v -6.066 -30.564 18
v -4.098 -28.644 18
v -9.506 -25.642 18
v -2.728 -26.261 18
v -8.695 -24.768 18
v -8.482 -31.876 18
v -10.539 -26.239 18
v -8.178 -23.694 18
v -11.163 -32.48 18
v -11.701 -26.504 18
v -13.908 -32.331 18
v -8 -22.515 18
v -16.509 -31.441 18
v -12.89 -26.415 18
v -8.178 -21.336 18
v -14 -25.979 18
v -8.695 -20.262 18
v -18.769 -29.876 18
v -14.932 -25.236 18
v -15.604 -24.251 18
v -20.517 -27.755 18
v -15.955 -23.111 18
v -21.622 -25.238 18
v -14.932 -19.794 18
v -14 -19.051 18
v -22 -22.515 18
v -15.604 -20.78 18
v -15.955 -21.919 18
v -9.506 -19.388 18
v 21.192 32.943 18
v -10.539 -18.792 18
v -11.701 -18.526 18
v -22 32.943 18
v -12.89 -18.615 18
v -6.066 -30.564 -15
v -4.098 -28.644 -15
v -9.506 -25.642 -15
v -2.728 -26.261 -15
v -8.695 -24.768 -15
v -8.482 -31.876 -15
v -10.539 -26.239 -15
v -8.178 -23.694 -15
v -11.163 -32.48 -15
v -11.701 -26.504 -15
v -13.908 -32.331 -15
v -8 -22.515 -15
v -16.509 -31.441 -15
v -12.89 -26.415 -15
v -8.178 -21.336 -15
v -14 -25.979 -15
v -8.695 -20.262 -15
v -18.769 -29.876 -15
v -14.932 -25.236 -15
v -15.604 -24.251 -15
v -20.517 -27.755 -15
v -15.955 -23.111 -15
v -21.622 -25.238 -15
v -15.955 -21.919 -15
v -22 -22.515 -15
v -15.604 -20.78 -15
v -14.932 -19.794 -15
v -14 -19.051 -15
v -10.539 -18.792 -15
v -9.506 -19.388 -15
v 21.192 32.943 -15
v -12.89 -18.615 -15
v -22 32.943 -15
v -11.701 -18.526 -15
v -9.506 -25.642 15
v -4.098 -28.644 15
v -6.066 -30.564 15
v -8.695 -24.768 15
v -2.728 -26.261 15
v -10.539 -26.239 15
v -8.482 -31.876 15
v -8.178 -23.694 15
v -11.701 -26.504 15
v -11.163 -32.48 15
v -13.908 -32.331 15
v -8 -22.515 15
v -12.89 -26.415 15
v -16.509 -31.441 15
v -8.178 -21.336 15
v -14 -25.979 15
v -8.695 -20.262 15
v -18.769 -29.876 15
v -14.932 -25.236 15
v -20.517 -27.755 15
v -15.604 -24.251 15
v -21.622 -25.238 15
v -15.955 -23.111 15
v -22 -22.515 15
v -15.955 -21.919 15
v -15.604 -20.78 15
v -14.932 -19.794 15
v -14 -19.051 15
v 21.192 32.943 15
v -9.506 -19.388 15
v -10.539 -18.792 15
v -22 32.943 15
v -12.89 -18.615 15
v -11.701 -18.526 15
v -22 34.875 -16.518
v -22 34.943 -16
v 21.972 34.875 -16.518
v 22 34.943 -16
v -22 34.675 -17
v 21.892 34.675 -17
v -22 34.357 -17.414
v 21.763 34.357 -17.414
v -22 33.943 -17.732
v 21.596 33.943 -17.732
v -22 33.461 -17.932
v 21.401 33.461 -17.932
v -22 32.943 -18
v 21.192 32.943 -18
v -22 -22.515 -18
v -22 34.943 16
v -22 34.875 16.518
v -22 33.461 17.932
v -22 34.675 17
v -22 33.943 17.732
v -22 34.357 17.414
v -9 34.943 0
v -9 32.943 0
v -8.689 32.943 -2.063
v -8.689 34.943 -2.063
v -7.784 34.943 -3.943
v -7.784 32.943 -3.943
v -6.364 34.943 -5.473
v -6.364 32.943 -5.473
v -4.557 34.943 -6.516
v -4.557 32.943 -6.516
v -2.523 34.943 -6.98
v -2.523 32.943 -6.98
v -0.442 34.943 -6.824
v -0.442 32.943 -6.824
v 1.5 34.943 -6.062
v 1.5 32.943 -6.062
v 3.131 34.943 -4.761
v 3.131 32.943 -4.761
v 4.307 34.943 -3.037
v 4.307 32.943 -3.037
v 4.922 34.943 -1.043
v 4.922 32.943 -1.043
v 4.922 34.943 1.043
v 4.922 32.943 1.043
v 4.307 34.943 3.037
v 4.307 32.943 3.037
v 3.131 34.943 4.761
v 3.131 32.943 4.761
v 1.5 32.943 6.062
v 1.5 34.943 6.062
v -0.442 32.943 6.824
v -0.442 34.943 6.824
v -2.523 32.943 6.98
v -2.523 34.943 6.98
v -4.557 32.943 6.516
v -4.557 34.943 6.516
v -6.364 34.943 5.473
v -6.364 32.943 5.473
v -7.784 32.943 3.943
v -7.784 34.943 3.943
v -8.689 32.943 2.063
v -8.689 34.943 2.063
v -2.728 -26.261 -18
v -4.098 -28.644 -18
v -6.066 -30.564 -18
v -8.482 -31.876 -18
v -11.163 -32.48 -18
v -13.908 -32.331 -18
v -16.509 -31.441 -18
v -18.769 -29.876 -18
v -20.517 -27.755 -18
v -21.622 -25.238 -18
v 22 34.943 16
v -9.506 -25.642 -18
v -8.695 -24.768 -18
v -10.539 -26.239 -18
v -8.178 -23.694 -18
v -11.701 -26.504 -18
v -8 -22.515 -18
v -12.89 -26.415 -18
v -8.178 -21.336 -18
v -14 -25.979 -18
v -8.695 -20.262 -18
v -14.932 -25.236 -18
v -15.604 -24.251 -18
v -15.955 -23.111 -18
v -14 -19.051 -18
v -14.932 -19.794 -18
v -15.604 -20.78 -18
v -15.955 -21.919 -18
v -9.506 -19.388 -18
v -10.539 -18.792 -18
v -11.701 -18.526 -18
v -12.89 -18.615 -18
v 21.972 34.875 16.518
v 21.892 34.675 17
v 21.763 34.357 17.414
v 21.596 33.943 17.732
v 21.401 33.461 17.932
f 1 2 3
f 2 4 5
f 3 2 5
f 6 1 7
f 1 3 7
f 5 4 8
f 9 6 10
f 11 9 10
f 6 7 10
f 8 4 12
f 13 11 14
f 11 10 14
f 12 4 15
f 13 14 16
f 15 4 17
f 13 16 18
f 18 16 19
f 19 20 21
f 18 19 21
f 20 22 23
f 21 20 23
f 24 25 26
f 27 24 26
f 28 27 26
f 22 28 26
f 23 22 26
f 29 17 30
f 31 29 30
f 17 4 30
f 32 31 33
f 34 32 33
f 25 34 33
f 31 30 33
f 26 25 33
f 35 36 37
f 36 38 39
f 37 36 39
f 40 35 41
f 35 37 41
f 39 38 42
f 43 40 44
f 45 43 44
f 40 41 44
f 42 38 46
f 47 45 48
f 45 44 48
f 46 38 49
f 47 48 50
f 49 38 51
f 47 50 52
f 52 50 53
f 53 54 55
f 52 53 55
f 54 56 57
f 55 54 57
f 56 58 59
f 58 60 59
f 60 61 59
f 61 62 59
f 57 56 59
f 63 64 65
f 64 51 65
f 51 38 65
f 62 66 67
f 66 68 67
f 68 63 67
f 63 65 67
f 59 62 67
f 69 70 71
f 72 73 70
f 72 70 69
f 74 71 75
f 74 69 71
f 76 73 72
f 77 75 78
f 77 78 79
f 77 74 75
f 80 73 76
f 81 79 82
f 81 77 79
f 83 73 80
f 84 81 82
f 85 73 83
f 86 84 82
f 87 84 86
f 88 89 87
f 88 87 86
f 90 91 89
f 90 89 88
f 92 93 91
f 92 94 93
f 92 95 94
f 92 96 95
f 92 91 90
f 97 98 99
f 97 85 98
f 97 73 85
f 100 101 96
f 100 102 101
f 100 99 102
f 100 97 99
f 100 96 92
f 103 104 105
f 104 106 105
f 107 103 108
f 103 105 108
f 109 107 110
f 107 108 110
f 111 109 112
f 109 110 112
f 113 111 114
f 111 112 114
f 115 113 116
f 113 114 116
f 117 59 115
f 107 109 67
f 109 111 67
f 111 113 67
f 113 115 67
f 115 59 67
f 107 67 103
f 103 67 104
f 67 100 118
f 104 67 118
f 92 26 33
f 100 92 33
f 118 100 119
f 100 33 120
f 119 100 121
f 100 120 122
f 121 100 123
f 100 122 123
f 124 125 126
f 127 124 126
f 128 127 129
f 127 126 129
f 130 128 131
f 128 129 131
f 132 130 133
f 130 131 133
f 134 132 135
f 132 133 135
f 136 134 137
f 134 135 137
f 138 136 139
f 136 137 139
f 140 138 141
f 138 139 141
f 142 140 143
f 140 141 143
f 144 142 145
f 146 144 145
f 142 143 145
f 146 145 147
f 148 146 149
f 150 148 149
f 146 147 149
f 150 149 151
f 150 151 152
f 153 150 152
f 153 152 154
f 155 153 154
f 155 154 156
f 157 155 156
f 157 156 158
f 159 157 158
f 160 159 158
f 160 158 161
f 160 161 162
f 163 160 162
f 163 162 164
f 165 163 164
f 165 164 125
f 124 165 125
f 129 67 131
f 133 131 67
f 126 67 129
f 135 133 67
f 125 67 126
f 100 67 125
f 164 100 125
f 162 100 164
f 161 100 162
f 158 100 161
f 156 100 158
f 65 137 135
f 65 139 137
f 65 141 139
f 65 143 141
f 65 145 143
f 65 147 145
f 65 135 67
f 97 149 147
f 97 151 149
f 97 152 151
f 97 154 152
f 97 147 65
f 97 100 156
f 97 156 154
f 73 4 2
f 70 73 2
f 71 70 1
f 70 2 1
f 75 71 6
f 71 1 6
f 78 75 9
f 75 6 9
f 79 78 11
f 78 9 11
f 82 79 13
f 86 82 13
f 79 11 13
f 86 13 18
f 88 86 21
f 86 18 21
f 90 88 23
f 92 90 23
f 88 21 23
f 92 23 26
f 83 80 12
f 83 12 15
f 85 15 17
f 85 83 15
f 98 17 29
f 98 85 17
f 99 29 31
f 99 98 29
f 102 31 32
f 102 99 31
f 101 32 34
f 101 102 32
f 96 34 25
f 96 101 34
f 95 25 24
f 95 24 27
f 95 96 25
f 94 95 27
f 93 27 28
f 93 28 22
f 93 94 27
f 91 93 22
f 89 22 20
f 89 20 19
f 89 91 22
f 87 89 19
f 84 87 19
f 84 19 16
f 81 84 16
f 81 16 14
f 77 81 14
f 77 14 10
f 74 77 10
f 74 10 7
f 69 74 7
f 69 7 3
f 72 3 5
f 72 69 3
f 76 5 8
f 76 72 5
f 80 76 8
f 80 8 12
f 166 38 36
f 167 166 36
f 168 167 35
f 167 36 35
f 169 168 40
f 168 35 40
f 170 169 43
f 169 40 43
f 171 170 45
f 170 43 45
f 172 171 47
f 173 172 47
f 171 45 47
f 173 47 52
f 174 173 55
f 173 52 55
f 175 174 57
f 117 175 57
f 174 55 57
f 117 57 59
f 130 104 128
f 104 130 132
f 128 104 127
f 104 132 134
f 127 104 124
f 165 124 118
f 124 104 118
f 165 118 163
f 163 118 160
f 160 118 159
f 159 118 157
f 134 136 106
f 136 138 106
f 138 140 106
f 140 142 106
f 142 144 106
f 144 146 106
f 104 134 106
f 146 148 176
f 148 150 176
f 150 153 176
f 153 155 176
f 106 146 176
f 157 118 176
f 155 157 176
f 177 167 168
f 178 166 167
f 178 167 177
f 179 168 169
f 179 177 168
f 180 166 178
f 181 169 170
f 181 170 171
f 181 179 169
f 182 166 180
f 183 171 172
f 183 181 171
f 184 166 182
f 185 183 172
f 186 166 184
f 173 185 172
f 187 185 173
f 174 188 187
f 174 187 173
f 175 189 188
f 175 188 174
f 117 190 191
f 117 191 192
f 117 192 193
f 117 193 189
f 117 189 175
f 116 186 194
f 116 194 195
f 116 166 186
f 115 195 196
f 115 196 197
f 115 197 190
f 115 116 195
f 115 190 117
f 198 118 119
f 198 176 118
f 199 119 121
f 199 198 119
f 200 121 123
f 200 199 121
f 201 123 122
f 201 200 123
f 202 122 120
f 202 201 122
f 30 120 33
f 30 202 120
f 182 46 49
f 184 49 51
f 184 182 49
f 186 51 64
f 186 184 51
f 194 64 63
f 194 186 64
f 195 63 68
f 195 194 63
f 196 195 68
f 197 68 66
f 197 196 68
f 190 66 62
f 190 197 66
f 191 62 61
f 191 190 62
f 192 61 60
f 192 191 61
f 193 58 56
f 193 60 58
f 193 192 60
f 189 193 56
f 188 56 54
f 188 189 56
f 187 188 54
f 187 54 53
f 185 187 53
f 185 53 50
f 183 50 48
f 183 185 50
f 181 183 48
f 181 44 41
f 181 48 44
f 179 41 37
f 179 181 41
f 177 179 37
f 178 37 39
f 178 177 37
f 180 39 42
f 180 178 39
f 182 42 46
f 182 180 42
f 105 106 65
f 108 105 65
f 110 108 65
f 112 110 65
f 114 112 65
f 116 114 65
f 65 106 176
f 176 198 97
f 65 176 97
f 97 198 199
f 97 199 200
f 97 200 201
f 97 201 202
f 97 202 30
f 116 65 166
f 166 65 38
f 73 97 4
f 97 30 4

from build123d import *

# Parameters (mm, degrees)
SKETCH_1_R              = 4
EXTRUDE_1_DEPTH         = 18
CUT_EXTRUDE_1_DEPTH     = 15
HOLE_WIZARD_14_0_14_1_D = 14
FILLET_1_R              = 2


with BuildPart() as part:
    # 草图1 → 凸台-拉伸1 (new, symmetric)
    with BuildSketch(Plane.XY):
        with BuildLine():
            Line((-22, 34.943115606), (22, 34.943115606))
            Line((22, 34.943115606), (-2.728161454, -26.261231719))
            ThreePointArc((-2.728161454, -26.261231719), (-13.908089954, -32.331437619), (-22, -22.515165785))
            Line((-22, -22.515165785), (-22, 34.943115606))
        make_face()
        with Locations((-12, -22.515165785)):
            Circle(SKETCH_1_R, mode=Mode.SUBTRACT)
    extrude(amount=EXTRUDE_1_DEPTH, both=True)

    # 草图2 → 切除-拉伸1 (cut, symmetric)
    with BuildSketch(Plane.XY):
        with BuildLine():
            Line((-22, 32.943115606), (21.191947548, 32.943115606))
            Line((21.191947548, 32.943115606), (-2.728161454, -26.261231719))
            ThreePointArc((-2.728161454, -26.261231719), (-13.908089954, -32.331437619), (-22, -22.515165785))
            Line((-22, -22.515165785), (-22, 32.943115606))
        make_face()
    extrude(amount=CUT_EXTRUDE_1_DEPTH, both=True, mode=Mode.SUBTRACT)

    # Ø14.0 (14) 直径孔1 (through all)
    with Locations(Plane(origin=(0, 34.943115606, 0), x_dir=(1, 0, 0), z_dir=(0, 1, 0))):
        with Locations((-2, 0)):
            Hole(HOLE_WIZARD_14_0_14_1_D / 2)

    # 圆角1
    fillet_1_edges = [part.edges().sort_by_distance(p)[0] for p in [
        (0, 34.943115606, 18),
        (0, 34.943115606, -18),
    ]]
    fillet(fillet_1_edges, radius=FILLET_1_R)


solid = part.part
